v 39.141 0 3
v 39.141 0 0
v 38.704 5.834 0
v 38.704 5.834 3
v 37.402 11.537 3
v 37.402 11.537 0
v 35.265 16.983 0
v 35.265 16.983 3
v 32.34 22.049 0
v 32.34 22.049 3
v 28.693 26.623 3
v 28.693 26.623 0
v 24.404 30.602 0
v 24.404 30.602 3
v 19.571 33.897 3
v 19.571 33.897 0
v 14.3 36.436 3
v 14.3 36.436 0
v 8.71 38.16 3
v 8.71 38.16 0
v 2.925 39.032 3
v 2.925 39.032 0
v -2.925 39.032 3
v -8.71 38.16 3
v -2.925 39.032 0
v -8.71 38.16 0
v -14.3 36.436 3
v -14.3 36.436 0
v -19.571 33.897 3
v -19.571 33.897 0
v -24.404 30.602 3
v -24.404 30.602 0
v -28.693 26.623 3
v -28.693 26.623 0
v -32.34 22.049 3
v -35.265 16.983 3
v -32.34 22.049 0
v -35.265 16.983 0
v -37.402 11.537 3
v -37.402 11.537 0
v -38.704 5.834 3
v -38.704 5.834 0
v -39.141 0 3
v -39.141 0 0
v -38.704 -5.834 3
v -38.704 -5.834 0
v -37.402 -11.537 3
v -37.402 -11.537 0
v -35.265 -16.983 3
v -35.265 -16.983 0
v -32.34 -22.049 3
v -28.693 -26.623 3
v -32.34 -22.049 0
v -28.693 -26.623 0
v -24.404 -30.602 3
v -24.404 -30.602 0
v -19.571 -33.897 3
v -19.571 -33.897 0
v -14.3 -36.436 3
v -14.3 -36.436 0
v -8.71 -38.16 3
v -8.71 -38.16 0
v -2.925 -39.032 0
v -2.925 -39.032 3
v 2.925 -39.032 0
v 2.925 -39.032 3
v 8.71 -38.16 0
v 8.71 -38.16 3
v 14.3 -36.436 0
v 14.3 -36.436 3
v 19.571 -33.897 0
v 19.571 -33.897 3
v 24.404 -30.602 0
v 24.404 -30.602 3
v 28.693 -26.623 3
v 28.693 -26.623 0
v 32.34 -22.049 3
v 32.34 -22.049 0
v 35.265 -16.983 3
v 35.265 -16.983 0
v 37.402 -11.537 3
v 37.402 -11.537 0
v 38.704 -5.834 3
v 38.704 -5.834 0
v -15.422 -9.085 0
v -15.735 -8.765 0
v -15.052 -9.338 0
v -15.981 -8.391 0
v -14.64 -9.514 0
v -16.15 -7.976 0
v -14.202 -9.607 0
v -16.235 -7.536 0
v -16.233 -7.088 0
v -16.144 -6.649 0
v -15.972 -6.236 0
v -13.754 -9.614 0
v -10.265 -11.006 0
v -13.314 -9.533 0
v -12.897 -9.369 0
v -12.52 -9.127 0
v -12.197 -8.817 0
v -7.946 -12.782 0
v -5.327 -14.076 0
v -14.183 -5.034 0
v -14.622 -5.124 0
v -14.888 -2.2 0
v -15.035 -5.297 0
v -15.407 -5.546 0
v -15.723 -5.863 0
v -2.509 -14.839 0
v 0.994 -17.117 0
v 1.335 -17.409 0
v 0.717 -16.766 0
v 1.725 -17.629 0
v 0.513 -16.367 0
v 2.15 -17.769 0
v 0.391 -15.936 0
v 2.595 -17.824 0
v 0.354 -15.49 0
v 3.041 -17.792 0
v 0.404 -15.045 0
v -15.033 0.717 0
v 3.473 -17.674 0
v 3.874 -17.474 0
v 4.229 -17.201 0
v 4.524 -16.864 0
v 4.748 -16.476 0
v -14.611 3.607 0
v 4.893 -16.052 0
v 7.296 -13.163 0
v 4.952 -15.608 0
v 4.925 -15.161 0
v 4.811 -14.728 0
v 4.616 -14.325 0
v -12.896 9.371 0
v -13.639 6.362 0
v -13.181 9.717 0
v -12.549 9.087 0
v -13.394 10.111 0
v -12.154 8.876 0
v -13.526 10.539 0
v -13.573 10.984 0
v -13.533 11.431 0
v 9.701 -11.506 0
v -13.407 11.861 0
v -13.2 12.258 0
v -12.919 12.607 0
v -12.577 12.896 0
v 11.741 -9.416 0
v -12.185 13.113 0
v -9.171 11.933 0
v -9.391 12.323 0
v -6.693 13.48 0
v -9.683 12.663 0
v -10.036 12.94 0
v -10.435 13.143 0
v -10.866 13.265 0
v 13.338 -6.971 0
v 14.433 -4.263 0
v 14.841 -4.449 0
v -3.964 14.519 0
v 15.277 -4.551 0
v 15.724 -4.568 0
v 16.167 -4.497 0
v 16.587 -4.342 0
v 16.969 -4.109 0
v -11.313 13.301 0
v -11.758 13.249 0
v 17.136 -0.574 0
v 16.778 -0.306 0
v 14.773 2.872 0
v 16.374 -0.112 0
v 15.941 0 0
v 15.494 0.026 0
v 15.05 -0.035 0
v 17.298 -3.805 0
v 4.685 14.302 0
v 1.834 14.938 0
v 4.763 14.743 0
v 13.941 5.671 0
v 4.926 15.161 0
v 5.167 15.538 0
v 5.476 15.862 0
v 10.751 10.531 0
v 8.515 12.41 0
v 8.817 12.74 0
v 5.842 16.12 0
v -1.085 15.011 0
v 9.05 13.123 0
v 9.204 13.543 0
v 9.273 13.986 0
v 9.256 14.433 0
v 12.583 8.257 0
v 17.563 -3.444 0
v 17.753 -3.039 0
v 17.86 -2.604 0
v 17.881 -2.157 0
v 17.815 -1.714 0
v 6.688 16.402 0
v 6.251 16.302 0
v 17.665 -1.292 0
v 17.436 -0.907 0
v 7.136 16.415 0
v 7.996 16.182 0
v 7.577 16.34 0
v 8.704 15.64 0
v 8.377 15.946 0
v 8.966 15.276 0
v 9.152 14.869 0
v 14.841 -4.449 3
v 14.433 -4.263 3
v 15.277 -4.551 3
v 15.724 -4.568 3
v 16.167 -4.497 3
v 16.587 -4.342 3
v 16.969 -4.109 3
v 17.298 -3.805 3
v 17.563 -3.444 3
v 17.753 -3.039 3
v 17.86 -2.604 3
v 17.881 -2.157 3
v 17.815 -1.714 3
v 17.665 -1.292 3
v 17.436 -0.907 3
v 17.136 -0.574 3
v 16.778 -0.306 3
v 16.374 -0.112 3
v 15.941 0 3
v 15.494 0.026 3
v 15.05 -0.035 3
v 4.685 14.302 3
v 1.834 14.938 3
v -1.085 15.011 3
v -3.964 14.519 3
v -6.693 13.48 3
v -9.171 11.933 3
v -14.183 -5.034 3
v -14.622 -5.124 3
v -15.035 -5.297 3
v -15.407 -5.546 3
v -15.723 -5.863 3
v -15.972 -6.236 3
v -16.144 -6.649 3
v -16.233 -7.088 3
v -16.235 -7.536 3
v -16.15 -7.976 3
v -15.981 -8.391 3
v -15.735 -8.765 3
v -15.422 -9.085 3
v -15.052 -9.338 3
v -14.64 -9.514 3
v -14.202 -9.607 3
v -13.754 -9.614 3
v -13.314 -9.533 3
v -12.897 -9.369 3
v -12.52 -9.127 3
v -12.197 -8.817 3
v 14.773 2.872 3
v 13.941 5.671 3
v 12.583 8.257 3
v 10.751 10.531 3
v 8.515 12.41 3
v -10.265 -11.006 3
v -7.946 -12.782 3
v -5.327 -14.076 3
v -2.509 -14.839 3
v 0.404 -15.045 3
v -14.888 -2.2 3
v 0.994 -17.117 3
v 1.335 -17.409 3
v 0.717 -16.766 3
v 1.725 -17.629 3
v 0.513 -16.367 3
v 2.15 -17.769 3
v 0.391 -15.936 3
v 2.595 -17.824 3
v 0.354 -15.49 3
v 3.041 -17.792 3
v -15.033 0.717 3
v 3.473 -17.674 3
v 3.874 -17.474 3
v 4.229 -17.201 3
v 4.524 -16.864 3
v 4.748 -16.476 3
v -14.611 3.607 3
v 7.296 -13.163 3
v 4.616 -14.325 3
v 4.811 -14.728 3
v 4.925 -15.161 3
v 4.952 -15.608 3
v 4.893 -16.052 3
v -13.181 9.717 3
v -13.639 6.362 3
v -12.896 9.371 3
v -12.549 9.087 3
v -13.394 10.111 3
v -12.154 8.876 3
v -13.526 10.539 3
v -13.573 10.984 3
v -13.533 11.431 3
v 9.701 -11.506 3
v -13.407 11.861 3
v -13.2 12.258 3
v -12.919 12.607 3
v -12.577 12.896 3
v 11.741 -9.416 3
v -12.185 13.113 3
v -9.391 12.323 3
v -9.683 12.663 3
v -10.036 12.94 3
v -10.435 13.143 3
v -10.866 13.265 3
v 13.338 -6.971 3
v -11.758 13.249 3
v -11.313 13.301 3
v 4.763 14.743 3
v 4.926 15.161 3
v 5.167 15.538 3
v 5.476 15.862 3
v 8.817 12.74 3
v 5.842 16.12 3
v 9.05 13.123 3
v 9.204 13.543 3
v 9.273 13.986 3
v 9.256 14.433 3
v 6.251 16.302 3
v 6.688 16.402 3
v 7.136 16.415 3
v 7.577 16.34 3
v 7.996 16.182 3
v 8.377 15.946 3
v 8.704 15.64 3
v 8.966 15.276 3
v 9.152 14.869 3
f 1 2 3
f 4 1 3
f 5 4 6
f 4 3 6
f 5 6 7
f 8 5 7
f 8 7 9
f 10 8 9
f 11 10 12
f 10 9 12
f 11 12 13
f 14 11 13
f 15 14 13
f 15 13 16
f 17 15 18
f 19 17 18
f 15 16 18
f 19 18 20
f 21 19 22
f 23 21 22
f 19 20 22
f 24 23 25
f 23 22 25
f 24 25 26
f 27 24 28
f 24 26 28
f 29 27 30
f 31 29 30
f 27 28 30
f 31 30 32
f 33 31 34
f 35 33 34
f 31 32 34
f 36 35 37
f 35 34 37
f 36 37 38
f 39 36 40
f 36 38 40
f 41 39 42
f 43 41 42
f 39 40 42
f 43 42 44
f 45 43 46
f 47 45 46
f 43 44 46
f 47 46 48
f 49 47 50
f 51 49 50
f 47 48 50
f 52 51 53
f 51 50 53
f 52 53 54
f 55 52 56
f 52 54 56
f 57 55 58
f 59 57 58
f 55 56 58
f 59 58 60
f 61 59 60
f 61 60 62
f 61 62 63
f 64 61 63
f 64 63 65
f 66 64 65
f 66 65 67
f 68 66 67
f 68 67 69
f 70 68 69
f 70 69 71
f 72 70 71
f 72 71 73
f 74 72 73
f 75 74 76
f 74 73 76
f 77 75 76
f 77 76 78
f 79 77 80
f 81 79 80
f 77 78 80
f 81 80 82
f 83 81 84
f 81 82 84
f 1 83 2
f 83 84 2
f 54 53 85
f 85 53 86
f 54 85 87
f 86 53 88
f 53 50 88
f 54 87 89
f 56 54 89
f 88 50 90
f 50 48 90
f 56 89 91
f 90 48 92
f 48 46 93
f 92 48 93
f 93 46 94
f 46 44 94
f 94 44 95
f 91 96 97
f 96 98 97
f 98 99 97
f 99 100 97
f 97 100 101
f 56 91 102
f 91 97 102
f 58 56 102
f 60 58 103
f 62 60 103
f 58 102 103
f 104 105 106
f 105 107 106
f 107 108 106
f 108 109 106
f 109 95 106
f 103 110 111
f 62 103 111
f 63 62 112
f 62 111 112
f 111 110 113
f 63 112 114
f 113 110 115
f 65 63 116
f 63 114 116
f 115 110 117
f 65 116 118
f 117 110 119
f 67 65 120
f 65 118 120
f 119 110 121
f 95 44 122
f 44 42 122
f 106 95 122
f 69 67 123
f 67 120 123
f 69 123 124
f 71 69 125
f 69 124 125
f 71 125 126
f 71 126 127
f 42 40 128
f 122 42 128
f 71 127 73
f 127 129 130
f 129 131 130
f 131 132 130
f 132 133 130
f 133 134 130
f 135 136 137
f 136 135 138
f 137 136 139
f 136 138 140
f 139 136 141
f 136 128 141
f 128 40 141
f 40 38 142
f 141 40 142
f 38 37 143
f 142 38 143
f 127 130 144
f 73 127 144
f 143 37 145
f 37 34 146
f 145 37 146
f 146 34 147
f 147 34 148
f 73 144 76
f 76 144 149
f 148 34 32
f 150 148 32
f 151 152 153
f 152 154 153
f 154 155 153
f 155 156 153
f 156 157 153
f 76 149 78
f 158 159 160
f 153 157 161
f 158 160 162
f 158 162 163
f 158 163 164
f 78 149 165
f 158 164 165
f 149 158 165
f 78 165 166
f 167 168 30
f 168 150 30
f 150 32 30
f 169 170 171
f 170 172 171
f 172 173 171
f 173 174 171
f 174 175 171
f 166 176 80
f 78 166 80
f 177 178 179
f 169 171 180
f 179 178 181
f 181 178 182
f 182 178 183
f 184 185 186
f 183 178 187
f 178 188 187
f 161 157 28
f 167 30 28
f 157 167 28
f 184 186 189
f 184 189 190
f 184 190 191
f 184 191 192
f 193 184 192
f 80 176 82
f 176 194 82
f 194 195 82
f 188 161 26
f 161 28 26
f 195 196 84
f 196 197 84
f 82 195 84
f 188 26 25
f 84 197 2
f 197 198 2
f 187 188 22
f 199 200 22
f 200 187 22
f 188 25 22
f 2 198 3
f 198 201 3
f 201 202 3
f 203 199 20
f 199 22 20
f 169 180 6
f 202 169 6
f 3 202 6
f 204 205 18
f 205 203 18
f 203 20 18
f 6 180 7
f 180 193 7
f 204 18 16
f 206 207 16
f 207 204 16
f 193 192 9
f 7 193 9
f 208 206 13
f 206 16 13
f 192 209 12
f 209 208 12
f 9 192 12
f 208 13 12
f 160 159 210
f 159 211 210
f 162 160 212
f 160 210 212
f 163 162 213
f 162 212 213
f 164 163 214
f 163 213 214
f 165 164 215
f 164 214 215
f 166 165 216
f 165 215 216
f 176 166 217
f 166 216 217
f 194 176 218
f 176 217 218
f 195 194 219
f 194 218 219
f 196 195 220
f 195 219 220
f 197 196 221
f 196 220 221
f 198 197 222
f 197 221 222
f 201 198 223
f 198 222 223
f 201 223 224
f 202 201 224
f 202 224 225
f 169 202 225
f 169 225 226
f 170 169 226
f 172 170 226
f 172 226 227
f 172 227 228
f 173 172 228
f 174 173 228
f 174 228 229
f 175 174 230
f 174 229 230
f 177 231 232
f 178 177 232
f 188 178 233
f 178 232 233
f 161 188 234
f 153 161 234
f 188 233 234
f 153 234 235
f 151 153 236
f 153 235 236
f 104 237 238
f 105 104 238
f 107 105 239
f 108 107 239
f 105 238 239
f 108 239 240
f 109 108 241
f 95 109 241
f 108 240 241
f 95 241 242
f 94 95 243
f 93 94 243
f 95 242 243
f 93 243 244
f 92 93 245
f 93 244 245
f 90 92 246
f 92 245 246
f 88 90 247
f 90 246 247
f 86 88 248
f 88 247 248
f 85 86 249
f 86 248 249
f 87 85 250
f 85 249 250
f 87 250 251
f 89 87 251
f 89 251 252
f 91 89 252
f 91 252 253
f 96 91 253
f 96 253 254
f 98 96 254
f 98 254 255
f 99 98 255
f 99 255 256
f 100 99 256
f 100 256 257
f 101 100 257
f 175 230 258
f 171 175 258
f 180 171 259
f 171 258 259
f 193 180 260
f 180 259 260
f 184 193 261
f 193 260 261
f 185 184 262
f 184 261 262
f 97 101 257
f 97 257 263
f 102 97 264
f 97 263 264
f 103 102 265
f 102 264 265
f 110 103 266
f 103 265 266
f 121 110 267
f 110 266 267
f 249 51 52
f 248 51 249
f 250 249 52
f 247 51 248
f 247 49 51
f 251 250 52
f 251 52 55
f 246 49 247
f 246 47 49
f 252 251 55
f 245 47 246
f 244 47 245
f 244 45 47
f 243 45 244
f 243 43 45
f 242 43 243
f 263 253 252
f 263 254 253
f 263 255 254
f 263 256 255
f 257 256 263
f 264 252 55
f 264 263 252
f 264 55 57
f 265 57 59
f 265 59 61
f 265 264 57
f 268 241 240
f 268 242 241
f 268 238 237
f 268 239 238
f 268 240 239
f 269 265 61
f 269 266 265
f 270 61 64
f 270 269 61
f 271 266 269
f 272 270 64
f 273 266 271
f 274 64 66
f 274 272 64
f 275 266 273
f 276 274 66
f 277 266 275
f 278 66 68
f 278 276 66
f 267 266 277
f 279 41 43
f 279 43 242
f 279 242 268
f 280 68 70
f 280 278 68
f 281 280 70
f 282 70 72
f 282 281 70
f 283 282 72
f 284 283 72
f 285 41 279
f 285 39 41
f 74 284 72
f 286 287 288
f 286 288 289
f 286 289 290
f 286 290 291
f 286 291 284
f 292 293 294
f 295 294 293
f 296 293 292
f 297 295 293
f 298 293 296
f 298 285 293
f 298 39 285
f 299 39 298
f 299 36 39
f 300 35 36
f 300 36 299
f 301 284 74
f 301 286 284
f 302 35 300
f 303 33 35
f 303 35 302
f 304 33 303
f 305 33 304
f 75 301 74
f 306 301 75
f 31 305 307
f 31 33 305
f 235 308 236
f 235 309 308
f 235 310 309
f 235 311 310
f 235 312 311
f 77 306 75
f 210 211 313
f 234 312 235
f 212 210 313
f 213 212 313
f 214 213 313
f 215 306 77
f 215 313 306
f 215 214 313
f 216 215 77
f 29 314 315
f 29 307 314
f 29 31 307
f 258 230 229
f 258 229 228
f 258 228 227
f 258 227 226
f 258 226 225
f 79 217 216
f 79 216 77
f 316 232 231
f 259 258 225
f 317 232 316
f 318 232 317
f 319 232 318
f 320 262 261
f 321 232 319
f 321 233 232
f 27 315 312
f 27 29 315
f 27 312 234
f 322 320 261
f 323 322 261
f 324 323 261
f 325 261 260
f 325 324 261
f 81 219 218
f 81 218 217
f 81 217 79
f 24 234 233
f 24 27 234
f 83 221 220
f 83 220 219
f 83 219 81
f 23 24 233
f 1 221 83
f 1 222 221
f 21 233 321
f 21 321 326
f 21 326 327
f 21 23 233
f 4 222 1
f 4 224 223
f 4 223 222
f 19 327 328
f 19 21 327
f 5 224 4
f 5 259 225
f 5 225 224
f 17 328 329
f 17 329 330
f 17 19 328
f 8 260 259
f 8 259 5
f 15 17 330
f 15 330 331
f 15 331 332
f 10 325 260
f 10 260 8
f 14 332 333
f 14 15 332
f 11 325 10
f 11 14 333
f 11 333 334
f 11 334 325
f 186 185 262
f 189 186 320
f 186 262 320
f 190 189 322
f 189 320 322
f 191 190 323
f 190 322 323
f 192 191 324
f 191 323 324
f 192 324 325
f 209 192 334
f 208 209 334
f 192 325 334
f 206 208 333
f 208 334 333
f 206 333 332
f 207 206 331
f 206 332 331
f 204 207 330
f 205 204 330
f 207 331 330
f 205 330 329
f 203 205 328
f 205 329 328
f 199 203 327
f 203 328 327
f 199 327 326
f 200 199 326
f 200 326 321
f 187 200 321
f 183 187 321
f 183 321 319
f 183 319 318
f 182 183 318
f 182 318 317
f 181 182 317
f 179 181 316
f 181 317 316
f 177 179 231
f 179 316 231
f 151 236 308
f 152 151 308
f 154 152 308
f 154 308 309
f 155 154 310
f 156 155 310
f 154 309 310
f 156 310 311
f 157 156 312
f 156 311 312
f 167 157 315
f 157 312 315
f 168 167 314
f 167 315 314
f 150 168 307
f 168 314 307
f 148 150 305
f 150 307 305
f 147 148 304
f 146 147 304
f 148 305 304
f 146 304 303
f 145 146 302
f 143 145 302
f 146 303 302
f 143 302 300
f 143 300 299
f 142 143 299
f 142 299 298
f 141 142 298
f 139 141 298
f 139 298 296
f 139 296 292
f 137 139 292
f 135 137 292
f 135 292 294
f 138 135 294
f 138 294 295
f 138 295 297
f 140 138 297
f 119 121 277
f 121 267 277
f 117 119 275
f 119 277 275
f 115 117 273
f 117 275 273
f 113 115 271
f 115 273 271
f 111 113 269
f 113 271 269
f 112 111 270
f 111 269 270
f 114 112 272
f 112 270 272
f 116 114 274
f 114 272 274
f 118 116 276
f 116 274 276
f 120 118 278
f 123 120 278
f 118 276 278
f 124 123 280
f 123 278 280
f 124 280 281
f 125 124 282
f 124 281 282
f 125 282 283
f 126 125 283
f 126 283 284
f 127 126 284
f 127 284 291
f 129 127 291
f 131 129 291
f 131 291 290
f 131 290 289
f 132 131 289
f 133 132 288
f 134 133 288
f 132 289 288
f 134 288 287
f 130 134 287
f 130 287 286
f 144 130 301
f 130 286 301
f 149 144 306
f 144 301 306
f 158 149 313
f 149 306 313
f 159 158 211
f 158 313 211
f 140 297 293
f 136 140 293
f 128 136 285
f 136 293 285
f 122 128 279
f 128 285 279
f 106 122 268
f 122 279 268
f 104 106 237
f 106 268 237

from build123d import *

# Parameters (mm, degrees)
F0_R     = 39.141402
F1_DEPTH = 3
F2_R     = 15.05
F3_DEPTH = 3
F5_R     = 2.3
F6_DEPTH = 3


with BuildPart() as f1:
    # F0 (on Top) → F1 (new body)
    with BuildSketch(Plane.XY):
        Circle(F0_R)
    extrude(amount=F1_DEPTH)

    # F2 (on face) → F3 (cut)
    with BuildSketch(Plane.XY.offset(3)):
        Circle(F2_R)
    extrude(amount=-F3_DEPTH, mode=Mode.SUBTRACT)

    # F5 (on face) → F6 (cut)
    with BuildSketch(Plane.XY.offset(3)):
        with Locations((15.584218, -2.272043)):
            Circle(F5_R)
        with Locations((2.653755, -15.524809)):
            Circle(F5_R)
        with Locations((-13.944715, -7.321658)):
            Circle(F5_R)
        with Locations((-11.273245, 11.001117)):
            Circle(F5_R)
        with Locations((6.977401, 14.120086)):
            Circle(F5_R)
    extrude(amount=-F6_DEPTH, mode=Mode.SUBTRACT)


solid = f1.part
